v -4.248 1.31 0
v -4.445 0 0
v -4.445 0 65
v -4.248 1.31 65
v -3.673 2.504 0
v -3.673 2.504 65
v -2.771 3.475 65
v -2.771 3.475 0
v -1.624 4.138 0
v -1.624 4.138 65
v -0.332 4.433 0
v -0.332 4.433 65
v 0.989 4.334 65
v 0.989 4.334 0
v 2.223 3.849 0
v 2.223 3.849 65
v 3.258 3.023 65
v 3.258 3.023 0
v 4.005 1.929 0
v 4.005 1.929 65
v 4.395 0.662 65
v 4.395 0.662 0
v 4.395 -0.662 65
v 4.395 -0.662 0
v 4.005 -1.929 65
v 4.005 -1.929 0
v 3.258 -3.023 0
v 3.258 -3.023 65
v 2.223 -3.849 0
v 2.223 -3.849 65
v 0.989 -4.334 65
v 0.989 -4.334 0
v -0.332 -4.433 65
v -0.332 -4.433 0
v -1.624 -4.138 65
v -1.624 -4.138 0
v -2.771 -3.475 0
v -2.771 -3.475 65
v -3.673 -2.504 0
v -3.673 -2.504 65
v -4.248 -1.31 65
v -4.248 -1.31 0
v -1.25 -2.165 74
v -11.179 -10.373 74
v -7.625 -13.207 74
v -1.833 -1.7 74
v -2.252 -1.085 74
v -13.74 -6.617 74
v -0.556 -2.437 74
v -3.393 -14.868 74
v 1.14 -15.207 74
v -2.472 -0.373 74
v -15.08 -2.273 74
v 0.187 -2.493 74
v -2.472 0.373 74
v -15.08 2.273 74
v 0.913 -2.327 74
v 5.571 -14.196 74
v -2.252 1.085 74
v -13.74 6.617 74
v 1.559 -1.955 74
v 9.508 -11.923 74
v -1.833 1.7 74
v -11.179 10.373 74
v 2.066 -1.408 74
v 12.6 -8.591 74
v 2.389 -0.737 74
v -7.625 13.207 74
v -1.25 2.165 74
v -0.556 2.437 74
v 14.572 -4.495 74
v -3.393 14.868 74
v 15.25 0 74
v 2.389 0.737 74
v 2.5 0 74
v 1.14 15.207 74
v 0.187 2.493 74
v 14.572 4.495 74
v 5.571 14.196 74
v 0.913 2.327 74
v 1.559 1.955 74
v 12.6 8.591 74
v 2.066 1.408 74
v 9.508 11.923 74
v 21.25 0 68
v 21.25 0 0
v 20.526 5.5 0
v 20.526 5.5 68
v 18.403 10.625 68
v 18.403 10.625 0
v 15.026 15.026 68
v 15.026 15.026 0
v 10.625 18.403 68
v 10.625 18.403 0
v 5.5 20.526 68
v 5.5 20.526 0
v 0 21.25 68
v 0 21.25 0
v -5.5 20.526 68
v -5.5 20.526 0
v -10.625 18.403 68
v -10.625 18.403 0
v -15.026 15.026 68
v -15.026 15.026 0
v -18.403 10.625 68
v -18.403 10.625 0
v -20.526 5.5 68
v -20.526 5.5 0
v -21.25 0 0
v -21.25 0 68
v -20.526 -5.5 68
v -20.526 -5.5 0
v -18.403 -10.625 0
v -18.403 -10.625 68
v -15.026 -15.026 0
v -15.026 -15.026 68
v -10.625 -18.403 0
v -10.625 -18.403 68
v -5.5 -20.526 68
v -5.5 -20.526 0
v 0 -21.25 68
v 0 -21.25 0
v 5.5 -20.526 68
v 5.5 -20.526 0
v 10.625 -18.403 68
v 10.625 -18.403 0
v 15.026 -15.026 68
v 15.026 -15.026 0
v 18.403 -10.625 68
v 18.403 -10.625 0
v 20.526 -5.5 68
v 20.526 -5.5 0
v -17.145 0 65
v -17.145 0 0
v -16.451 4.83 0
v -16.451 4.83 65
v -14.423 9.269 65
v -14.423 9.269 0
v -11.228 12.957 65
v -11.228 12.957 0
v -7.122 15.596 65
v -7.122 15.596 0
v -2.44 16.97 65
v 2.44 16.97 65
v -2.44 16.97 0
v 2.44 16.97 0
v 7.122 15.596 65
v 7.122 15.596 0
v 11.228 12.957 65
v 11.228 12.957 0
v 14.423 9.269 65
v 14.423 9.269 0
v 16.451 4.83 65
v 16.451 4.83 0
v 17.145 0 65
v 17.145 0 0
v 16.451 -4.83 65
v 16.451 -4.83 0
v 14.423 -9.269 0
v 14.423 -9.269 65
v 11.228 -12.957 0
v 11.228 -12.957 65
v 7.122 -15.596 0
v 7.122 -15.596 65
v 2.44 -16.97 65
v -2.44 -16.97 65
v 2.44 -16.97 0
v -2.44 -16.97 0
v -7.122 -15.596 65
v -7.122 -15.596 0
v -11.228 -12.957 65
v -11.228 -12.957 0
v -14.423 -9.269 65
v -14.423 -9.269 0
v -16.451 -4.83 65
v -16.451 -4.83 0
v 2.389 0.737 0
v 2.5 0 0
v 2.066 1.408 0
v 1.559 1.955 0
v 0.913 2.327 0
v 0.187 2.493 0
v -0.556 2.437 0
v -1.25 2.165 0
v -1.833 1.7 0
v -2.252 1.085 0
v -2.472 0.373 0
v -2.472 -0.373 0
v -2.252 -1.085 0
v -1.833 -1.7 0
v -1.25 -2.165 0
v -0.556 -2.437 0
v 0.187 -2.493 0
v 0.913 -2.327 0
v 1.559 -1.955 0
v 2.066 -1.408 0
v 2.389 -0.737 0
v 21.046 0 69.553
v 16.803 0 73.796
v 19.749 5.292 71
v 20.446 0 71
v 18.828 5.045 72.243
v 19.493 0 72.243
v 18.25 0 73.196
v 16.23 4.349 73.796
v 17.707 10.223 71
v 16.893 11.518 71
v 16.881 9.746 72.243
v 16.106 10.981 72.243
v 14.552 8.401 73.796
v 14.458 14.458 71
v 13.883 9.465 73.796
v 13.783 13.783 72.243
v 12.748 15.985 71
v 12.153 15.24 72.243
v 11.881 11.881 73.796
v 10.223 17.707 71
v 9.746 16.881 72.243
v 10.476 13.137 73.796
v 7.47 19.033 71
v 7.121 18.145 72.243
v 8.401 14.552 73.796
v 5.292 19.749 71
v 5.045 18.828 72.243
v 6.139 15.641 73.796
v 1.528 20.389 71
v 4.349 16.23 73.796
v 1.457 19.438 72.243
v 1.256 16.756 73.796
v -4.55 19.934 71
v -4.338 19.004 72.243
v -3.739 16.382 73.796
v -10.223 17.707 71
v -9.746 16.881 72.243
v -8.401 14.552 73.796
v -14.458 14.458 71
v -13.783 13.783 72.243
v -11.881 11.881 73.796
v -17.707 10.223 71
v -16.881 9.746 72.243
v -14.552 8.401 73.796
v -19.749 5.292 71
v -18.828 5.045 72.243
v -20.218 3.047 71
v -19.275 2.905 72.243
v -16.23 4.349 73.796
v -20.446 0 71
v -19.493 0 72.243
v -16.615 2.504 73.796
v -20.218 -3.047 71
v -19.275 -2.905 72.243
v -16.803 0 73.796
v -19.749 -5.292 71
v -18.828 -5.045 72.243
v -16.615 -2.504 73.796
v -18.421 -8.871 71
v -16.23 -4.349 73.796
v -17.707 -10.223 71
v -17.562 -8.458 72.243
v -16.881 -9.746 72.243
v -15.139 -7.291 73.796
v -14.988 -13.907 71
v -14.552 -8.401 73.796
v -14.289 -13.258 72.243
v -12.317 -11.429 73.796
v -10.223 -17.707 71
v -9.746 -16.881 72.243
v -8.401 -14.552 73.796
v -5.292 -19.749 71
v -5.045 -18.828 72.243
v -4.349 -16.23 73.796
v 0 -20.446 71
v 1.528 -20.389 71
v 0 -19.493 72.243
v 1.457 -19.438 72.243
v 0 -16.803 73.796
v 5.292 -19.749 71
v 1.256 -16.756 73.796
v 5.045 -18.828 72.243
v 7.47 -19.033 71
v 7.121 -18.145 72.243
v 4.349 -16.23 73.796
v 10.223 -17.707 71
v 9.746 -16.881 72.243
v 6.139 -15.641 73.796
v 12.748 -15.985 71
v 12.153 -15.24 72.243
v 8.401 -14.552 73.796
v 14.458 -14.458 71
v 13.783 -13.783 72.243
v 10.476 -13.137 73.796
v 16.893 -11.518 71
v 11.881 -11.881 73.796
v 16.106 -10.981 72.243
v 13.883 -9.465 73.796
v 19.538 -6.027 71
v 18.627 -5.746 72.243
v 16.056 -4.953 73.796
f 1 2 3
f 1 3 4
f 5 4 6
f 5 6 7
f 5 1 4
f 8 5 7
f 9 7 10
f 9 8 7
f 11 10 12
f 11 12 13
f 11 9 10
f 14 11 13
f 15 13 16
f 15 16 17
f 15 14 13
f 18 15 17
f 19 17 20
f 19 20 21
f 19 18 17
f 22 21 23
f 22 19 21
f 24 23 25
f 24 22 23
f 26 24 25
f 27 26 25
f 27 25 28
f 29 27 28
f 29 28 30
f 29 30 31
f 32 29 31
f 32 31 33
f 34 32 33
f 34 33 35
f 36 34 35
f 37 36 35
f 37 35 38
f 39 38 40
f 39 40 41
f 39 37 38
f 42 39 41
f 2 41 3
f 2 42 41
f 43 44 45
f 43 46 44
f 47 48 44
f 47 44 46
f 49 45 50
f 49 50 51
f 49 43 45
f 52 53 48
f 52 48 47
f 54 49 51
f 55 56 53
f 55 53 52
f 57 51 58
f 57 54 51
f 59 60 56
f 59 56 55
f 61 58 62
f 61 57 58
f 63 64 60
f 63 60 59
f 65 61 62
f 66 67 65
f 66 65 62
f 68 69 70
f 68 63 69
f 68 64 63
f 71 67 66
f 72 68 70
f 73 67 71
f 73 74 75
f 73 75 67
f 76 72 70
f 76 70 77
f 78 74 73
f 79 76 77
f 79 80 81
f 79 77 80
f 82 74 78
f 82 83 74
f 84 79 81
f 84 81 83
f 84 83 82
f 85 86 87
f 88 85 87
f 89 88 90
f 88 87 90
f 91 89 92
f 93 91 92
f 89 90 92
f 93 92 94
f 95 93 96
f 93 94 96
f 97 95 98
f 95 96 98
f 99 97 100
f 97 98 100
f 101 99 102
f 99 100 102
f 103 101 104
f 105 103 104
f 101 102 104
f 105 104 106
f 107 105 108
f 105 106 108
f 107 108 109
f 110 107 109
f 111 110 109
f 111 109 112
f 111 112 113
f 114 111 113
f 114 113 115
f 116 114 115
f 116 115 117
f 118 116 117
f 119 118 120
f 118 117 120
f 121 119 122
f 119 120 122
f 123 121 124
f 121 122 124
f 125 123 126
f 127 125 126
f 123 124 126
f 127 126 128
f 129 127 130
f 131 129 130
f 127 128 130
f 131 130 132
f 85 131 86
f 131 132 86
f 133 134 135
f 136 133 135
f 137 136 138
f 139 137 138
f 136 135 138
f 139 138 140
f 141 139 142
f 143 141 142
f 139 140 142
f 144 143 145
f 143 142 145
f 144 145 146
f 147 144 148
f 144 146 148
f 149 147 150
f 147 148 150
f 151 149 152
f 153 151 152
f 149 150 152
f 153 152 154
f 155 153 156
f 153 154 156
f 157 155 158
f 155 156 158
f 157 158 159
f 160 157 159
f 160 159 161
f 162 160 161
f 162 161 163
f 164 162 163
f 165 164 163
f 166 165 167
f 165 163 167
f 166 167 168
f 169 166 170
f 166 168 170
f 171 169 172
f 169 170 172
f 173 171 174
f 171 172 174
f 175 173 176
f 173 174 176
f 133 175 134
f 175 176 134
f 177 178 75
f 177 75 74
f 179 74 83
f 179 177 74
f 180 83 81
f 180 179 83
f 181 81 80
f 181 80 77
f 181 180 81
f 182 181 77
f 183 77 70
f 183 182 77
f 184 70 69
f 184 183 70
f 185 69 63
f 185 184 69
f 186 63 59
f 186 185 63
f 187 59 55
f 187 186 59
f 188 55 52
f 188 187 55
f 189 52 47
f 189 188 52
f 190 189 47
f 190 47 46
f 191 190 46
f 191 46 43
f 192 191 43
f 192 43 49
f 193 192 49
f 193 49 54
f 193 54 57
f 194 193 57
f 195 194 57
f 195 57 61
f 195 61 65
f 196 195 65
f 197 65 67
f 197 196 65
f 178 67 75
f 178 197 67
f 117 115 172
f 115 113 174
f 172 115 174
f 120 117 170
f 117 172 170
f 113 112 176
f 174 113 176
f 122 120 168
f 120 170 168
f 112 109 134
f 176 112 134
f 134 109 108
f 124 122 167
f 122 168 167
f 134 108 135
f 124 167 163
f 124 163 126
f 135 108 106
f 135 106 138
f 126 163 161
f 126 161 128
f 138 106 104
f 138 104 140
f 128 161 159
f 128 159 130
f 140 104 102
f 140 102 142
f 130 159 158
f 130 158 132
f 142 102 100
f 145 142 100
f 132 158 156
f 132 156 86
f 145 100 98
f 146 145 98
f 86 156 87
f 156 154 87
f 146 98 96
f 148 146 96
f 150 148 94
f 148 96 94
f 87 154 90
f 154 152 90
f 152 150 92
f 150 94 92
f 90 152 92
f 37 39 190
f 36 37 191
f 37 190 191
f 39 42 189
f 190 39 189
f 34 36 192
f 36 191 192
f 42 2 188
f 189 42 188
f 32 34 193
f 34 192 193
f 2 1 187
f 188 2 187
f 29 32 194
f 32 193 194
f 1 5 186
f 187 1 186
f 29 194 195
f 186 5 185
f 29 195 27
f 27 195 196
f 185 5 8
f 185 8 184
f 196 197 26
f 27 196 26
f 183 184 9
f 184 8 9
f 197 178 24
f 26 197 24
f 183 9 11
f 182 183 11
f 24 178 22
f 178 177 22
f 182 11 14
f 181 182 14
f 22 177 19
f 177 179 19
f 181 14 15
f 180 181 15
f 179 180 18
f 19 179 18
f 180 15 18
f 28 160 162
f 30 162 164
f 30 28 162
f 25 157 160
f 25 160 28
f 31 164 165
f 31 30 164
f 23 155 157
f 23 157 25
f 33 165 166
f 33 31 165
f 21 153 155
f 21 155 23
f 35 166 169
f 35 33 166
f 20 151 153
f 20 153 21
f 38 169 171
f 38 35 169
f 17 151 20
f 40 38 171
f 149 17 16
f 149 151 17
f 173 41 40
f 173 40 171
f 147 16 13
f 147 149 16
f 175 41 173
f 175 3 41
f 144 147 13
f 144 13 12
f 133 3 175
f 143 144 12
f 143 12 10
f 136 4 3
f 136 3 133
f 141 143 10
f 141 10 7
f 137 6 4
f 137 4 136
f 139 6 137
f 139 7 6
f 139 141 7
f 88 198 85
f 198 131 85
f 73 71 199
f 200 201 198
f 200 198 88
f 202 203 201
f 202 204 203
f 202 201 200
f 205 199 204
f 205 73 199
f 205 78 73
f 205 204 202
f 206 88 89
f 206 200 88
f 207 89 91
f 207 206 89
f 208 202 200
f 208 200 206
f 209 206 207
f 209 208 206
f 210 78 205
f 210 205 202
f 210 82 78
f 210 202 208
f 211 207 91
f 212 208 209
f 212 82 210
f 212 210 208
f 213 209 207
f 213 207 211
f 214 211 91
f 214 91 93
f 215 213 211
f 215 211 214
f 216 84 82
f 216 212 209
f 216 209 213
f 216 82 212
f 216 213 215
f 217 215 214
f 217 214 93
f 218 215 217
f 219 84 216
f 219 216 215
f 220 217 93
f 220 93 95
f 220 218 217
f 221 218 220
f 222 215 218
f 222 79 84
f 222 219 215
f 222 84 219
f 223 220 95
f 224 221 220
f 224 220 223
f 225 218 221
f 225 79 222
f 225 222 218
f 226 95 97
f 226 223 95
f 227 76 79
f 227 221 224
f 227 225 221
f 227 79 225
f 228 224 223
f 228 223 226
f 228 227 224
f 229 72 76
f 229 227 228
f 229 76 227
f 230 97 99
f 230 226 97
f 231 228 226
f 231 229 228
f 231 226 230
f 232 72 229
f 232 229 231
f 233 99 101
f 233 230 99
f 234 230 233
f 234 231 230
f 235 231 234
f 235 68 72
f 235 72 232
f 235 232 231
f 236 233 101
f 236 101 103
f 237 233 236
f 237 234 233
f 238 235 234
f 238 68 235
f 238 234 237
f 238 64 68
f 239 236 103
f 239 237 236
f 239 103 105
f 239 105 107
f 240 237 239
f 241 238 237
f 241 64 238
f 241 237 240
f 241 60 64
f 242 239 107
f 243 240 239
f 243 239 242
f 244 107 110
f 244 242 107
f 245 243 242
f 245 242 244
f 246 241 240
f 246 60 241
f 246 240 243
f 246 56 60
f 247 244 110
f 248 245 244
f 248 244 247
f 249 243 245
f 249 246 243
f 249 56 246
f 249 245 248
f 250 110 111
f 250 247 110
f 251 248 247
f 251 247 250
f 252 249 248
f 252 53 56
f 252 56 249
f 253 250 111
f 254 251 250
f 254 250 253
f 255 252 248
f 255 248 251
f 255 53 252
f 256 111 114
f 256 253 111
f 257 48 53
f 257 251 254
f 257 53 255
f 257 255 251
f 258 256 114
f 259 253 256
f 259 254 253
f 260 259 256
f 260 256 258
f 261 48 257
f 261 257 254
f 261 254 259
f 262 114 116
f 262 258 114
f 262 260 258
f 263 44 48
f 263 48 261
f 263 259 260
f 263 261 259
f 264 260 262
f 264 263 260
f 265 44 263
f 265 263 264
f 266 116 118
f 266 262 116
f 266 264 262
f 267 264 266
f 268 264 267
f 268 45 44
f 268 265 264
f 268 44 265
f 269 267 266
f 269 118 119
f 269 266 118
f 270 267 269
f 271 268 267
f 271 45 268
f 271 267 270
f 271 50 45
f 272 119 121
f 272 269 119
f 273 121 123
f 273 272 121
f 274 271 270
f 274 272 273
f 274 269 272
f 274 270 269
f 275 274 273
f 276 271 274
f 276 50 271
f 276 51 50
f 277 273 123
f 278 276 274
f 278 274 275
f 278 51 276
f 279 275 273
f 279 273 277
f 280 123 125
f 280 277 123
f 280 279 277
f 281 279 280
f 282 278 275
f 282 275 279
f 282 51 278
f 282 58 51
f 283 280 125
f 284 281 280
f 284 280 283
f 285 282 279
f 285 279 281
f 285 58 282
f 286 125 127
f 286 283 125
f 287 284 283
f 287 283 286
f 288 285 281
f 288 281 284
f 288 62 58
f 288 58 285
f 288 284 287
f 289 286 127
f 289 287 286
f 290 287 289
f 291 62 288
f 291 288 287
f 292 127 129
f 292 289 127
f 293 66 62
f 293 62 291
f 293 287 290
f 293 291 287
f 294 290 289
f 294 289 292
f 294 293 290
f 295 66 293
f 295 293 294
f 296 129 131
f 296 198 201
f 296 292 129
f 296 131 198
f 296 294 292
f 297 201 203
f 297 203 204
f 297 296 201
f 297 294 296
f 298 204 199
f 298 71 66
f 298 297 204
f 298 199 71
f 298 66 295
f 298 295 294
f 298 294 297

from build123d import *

# Parameters (mm, degrees)
SKETCH1_R           = 21.25
SKETCH1_R_2         = 2.5
BOSS_EXTRUDE1_DEPTH = 74
FILLET1_R           = 6
SKETCH2_R           = 17.145
SKETCH2_R_2         = 4.445
CUT_EXTRUDE1_DEPTH  = 65


with BuildPart() as part:
    # Sketch1 → Boss-Extrude1 (new body)
    with BuildSketch(Plane.XY):
        Circle(SKETCH1_R)
        Circle(SKETCH1_R_2, mode=Mode.SUBTRACT)
    extrude(amount=BOSS_EXTRUDE1_DEPTH)

    # Fillet1
    fillet1_edges = [part.edges().sort_by_distance(p)[0] for p in [
        (-21.25, 0, 74),
    ]]
    fillet(fillet1_edges, radius=FILLET1_R)

    # Sketch2 → Cut-Extrude1 (cut)
    with BuildSketch(Plane(origin=(0, 0, 0), x_dir=(-1, 0, 0), z_dir=(0, 0, -1))):
        Circle(SKETCH2_R)
        Circle(SKETCH2_R_2, mode=Mode.SUBTRACT)
    extrude(amount=-CUT_EXTRUDE1_DEPTH, mode=Mode.SUBTRACT)


solid = part.part
